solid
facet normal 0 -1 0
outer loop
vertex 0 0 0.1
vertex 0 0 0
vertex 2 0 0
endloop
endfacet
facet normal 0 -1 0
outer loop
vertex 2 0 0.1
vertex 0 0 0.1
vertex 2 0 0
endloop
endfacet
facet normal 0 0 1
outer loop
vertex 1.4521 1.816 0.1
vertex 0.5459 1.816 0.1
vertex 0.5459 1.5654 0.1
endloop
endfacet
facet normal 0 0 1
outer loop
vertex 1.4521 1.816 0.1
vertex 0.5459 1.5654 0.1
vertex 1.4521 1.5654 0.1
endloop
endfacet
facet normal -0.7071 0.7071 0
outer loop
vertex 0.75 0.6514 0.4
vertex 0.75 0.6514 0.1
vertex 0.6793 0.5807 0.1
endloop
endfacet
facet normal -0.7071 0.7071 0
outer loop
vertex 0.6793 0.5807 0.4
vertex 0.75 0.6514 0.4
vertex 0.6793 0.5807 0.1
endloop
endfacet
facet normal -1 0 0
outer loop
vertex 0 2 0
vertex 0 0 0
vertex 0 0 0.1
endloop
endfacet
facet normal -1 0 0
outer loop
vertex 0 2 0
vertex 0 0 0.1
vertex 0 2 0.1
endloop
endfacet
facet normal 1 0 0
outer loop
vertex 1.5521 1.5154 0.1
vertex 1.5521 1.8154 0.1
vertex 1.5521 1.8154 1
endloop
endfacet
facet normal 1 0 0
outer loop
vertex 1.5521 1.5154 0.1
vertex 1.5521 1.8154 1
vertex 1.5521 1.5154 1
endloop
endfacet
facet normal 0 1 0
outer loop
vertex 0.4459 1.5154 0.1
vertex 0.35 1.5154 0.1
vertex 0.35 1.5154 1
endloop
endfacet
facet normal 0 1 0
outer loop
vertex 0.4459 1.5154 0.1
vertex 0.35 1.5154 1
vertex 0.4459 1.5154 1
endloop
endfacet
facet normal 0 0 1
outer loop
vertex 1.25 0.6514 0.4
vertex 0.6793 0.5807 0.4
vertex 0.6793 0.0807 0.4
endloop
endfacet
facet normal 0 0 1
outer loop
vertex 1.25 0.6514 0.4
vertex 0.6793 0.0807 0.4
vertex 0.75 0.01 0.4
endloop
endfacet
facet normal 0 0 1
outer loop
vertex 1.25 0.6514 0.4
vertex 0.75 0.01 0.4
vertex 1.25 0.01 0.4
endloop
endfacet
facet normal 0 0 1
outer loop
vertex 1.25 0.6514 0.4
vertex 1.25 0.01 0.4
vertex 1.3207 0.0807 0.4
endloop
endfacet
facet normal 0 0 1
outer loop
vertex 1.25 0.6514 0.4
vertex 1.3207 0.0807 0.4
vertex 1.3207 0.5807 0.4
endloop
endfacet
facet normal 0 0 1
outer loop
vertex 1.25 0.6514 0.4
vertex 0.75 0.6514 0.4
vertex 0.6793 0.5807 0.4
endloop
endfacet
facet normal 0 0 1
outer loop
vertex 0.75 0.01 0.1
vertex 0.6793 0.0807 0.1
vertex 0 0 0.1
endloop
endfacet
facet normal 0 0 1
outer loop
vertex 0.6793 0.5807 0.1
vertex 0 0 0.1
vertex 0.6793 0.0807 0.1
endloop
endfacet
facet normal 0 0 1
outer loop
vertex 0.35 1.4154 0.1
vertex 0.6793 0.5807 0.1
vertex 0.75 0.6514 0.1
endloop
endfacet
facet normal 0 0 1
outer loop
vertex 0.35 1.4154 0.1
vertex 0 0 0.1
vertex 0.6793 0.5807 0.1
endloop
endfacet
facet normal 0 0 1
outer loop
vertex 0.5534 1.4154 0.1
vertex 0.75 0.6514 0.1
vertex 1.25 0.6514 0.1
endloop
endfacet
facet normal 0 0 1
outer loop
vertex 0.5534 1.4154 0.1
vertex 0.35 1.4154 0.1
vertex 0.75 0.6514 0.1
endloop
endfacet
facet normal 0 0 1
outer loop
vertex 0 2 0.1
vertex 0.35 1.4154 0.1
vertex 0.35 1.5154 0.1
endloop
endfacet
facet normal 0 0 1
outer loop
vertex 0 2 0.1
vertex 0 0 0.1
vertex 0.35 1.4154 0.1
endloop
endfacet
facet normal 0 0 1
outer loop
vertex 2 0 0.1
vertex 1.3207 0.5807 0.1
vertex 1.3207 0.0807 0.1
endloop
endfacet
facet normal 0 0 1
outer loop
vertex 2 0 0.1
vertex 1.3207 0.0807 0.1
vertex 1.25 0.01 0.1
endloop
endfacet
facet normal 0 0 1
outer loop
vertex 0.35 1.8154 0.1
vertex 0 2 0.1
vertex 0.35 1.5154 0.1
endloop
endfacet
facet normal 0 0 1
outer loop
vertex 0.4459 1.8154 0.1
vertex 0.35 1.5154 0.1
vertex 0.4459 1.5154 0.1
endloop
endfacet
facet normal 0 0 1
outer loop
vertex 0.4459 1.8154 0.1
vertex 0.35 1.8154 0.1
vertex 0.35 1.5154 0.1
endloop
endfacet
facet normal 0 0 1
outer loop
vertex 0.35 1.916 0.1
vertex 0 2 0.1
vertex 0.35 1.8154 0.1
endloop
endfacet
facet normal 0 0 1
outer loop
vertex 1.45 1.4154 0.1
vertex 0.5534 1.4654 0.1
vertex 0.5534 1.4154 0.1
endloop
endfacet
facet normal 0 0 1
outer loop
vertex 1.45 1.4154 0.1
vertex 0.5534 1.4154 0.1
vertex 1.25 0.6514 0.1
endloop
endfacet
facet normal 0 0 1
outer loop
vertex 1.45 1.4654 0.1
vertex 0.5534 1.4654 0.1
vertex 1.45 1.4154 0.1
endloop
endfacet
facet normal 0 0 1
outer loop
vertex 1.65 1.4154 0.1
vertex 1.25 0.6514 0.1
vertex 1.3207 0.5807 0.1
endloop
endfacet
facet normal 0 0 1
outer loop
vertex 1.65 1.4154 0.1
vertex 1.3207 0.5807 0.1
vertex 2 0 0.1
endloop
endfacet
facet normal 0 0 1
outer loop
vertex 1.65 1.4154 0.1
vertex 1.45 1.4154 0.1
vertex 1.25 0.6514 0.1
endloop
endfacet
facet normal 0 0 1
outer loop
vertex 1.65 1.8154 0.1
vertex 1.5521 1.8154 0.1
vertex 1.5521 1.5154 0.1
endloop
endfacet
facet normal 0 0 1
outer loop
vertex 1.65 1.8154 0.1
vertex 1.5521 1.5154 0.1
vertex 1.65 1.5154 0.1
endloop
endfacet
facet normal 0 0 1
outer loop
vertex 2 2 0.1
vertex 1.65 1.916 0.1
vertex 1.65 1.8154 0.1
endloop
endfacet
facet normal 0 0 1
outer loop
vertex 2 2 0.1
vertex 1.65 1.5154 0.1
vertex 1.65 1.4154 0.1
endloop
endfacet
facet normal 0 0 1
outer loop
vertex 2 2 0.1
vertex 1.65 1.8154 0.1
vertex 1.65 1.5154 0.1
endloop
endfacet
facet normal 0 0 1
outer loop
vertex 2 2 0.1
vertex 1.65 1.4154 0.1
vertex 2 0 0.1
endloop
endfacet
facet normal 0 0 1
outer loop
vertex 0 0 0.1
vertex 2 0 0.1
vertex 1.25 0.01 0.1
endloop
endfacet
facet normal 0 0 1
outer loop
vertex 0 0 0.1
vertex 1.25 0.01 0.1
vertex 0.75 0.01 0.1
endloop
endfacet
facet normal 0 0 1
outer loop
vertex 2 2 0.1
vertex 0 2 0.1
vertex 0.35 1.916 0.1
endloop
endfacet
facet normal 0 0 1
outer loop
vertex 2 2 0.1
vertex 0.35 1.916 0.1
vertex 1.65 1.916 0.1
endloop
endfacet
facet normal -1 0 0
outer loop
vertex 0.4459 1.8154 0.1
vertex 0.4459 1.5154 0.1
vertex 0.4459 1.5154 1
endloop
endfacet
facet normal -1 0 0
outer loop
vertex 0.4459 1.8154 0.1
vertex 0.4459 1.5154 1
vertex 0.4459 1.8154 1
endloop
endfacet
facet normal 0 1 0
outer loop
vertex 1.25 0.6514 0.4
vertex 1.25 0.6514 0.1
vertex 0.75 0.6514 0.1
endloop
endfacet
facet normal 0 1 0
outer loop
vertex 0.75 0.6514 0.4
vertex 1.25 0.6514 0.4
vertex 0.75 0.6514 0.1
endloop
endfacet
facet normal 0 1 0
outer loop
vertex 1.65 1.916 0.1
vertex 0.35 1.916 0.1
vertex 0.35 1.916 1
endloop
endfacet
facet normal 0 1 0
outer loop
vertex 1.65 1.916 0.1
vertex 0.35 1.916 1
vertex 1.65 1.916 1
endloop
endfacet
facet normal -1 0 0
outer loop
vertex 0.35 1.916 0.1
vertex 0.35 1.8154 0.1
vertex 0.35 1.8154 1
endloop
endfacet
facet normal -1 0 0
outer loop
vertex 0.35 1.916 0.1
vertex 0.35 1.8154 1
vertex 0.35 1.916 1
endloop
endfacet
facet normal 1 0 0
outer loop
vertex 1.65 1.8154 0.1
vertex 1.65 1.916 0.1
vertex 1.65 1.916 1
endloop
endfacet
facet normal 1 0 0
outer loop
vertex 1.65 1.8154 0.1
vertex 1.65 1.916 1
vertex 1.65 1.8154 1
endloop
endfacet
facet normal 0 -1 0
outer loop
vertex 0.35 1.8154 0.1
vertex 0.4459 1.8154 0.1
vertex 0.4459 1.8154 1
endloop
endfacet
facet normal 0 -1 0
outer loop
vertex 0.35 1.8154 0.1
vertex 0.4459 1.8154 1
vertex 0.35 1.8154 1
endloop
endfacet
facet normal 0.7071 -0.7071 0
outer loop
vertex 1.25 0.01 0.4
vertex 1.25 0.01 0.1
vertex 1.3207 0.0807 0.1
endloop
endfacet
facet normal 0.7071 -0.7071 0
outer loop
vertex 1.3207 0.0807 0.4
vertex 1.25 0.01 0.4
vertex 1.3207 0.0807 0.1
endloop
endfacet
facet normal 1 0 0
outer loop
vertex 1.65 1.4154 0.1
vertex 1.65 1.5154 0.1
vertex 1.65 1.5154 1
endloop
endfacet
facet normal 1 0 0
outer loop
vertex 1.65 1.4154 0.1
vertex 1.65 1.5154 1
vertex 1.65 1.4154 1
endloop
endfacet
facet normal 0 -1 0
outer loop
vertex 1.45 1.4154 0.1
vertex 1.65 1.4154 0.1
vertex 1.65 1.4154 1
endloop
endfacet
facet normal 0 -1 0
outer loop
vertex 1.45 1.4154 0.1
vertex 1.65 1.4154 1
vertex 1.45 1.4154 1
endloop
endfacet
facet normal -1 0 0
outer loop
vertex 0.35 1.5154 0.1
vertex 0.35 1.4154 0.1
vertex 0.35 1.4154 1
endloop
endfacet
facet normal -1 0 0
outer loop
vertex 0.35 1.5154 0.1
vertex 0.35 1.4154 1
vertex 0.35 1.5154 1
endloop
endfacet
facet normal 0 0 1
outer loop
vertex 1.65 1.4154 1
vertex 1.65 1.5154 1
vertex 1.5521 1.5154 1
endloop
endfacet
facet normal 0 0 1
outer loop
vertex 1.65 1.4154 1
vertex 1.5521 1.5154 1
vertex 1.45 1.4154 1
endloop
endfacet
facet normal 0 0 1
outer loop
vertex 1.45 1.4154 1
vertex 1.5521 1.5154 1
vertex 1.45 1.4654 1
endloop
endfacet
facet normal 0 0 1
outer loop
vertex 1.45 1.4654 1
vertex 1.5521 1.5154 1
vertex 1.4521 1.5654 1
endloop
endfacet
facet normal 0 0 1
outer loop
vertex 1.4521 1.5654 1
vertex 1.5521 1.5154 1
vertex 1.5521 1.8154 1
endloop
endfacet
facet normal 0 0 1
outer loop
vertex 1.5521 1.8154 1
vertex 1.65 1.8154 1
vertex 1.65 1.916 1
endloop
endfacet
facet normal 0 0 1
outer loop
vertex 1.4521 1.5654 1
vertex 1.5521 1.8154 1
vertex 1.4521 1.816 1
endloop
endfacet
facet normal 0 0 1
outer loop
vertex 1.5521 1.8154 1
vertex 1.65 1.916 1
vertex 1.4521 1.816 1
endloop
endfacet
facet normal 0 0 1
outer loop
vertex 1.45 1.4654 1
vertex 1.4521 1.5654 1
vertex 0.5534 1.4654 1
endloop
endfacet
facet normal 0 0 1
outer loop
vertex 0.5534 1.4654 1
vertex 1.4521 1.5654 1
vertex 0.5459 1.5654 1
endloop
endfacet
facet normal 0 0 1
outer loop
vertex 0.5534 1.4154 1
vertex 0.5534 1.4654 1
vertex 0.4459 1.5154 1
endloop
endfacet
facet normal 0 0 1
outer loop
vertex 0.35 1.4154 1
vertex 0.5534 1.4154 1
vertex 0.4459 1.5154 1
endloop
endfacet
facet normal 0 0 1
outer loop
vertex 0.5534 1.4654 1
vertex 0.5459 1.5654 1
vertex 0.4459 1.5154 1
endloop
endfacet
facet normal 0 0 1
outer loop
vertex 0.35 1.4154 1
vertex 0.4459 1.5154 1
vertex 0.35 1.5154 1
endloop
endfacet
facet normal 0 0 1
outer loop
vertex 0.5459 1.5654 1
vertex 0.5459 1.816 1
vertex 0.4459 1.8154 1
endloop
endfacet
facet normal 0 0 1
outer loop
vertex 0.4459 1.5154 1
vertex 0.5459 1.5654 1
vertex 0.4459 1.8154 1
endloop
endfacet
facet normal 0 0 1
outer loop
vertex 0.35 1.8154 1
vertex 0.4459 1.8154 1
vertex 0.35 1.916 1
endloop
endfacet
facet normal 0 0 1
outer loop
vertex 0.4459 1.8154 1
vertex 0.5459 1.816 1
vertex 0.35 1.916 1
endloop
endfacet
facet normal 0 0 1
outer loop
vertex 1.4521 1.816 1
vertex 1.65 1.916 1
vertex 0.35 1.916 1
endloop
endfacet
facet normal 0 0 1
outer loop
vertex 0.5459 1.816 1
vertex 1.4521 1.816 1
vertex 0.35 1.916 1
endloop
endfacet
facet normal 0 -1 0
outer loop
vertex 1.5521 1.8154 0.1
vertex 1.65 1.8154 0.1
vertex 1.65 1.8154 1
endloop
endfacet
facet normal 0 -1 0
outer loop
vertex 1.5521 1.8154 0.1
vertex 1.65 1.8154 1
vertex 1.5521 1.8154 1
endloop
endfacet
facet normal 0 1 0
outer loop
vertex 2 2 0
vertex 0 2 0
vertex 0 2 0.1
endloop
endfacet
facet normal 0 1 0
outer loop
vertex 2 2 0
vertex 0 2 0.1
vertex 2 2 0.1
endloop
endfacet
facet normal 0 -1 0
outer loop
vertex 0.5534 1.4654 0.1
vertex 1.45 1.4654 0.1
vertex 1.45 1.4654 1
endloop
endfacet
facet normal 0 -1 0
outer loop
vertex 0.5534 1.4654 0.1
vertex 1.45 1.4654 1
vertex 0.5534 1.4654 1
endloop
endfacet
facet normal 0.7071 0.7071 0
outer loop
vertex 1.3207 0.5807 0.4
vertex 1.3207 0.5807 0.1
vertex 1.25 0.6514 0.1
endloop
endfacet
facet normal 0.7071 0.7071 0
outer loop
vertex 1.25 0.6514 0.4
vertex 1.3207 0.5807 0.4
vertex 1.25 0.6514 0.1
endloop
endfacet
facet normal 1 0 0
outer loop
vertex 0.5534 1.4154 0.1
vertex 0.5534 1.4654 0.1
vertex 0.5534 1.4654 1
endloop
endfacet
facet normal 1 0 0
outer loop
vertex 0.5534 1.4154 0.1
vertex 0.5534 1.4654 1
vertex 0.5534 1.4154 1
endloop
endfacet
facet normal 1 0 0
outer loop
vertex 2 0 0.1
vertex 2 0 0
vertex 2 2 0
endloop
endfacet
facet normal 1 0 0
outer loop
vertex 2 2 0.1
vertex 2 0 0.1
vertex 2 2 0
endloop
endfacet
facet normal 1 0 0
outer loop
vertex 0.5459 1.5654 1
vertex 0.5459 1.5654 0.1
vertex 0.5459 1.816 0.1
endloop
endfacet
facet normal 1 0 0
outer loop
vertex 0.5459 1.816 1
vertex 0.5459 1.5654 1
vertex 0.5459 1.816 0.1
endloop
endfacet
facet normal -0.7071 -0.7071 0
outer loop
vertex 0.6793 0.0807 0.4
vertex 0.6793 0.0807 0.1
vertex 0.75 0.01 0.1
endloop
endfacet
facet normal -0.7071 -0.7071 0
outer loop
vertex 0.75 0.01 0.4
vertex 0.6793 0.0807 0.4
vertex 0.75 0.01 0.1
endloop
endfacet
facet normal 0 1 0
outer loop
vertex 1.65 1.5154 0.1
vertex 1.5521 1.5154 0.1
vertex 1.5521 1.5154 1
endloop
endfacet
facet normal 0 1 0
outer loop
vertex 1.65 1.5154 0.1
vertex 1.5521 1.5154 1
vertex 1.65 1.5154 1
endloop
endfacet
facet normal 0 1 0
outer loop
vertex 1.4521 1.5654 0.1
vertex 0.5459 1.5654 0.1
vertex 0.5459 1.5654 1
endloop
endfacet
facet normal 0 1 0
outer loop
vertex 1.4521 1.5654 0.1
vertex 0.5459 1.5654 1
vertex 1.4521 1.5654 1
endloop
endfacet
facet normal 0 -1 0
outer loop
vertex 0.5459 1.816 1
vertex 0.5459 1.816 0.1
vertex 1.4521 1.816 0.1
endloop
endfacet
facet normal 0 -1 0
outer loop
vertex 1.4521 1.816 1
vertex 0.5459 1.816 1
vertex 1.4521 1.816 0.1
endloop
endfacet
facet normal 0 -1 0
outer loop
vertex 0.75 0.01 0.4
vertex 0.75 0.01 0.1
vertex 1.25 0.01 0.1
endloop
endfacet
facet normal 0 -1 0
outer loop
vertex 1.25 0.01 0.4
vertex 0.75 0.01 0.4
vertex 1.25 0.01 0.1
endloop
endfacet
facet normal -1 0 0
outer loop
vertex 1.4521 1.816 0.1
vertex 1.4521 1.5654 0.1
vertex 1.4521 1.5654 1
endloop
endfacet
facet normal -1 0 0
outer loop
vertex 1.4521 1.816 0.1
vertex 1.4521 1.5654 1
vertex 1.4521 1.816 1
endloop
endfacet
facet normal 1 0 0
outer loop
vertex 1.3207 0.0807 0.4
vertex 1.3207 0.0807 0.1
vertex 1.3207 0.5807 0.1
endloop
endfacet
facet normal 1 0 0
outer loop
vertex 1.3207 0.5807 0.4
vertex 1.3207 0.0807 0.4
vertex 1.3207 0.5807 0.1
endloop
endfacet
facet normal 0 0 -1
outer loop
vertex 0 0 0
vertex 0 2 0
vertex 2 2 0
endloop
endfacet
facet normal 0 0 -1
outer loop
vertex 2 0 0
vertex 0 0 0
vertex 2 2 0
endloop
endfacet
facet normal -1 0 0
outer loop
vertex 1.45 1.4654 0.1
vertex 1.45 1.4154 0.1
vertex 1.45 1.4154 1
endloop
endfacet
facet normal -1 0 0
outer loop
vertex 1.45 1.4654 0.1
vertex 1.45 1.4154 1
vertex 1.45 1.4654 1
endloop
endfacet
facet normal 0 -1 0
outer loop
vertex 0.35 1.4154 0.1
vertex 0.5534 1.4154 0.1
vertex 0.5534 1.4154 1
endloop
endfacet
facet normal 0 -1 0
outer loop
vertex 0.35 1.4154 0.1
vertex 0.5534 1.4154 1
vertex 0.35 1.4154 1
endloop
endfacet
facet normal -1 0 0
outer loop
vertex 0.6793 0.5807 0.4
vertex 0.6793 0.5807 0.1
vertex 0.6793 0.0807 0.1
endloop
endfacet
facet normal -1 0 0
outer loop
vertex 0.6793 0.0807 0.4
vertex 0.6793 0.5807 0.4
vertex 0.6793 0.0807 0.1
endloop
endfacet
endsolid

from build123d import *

# Parameters (mm, degrees)
ESQUISSE1_W        = 2
ESQUISSE1_H        = 2
BOSS_EXTRU_1_DEPTH = 0.1
BOSS_EXTRU_2_DEPTH = 0.9
COQUE3_START       = 0.1
COQUE3_OUTLINE_W   = 0.906146658
COQUE3_OUTLINE_H   = 0.250612044
COQUE3_DEPTH       = 0.9
BOSS_EXTRU_3_DEPTH = 0.3


# Read off the part's stored shape, not the designer's step: Coque3
with BuildPart() as part:
    # Esquisse1 → Boss.-Extru.1 (new body)
    with BuildSketch(Plane.XY):
        with Locations((1, 1)):
            Rectangle(ESQUISSE1_W, ESQUISSE1_H)
    extrude(amount=BOSS_EXTRU_1_DEPTH)

    # Esquisse2 → Boss.-Extru.2 (add)
    with BuildSketch(Plane.XY.offset(0.1)):
        Polygon((0.35, 1.916037567), (1.65, 1.916037567), (1.65, 1.815425523), (1.552079072, 1.815425523), (1.552079072, 1.515425523), (1.65, 1.515425523), (1.65, 1.415425523), (1.45, 1.415425523), (1.45, 1.465425523), (0.553370886, 1.465425523), (0.553370886, 1.415425523), (0.35, 1.415425523), (0.35, 1.515425523), (0.445932414, 1.515425523), (0.445932414, 1.815425523), (0.35, 1.815425523), align=None)
    extrude(amount=BOSS_EXTRU_2_DEPTH)

    # Coque3 outline → Coque3 (cut)
    with BuildSketch(Plane.XY.offset(COQUE3_START)):
        with Locations((0.999005743, 1.690731545)):
            Rectangle(COQUE3_OUTLINE_W, COQUE3_OUTLINE_H)
    extrude(amount=COQUE3_DEPTH, mode=Mode.SUBTRACT)

    # Esquisse3 → Boss.-Extru.3 (add)
    with BuildSketch(Plane.XY.offset(0.1)):
        Polygon((0.679289322, 0.580710678), (0.679289322, 0.080710678), (0.75, 0.01), (1.25, 0.01), (1.320710678, 0.080710678), (1.320710678, 0.580710678), (1.25, 0.651421356), (0.75, 0.651421356), align=None)
    extrude(amount=BOSS_EXTRU_3_DEPTH)


solid = part.part
